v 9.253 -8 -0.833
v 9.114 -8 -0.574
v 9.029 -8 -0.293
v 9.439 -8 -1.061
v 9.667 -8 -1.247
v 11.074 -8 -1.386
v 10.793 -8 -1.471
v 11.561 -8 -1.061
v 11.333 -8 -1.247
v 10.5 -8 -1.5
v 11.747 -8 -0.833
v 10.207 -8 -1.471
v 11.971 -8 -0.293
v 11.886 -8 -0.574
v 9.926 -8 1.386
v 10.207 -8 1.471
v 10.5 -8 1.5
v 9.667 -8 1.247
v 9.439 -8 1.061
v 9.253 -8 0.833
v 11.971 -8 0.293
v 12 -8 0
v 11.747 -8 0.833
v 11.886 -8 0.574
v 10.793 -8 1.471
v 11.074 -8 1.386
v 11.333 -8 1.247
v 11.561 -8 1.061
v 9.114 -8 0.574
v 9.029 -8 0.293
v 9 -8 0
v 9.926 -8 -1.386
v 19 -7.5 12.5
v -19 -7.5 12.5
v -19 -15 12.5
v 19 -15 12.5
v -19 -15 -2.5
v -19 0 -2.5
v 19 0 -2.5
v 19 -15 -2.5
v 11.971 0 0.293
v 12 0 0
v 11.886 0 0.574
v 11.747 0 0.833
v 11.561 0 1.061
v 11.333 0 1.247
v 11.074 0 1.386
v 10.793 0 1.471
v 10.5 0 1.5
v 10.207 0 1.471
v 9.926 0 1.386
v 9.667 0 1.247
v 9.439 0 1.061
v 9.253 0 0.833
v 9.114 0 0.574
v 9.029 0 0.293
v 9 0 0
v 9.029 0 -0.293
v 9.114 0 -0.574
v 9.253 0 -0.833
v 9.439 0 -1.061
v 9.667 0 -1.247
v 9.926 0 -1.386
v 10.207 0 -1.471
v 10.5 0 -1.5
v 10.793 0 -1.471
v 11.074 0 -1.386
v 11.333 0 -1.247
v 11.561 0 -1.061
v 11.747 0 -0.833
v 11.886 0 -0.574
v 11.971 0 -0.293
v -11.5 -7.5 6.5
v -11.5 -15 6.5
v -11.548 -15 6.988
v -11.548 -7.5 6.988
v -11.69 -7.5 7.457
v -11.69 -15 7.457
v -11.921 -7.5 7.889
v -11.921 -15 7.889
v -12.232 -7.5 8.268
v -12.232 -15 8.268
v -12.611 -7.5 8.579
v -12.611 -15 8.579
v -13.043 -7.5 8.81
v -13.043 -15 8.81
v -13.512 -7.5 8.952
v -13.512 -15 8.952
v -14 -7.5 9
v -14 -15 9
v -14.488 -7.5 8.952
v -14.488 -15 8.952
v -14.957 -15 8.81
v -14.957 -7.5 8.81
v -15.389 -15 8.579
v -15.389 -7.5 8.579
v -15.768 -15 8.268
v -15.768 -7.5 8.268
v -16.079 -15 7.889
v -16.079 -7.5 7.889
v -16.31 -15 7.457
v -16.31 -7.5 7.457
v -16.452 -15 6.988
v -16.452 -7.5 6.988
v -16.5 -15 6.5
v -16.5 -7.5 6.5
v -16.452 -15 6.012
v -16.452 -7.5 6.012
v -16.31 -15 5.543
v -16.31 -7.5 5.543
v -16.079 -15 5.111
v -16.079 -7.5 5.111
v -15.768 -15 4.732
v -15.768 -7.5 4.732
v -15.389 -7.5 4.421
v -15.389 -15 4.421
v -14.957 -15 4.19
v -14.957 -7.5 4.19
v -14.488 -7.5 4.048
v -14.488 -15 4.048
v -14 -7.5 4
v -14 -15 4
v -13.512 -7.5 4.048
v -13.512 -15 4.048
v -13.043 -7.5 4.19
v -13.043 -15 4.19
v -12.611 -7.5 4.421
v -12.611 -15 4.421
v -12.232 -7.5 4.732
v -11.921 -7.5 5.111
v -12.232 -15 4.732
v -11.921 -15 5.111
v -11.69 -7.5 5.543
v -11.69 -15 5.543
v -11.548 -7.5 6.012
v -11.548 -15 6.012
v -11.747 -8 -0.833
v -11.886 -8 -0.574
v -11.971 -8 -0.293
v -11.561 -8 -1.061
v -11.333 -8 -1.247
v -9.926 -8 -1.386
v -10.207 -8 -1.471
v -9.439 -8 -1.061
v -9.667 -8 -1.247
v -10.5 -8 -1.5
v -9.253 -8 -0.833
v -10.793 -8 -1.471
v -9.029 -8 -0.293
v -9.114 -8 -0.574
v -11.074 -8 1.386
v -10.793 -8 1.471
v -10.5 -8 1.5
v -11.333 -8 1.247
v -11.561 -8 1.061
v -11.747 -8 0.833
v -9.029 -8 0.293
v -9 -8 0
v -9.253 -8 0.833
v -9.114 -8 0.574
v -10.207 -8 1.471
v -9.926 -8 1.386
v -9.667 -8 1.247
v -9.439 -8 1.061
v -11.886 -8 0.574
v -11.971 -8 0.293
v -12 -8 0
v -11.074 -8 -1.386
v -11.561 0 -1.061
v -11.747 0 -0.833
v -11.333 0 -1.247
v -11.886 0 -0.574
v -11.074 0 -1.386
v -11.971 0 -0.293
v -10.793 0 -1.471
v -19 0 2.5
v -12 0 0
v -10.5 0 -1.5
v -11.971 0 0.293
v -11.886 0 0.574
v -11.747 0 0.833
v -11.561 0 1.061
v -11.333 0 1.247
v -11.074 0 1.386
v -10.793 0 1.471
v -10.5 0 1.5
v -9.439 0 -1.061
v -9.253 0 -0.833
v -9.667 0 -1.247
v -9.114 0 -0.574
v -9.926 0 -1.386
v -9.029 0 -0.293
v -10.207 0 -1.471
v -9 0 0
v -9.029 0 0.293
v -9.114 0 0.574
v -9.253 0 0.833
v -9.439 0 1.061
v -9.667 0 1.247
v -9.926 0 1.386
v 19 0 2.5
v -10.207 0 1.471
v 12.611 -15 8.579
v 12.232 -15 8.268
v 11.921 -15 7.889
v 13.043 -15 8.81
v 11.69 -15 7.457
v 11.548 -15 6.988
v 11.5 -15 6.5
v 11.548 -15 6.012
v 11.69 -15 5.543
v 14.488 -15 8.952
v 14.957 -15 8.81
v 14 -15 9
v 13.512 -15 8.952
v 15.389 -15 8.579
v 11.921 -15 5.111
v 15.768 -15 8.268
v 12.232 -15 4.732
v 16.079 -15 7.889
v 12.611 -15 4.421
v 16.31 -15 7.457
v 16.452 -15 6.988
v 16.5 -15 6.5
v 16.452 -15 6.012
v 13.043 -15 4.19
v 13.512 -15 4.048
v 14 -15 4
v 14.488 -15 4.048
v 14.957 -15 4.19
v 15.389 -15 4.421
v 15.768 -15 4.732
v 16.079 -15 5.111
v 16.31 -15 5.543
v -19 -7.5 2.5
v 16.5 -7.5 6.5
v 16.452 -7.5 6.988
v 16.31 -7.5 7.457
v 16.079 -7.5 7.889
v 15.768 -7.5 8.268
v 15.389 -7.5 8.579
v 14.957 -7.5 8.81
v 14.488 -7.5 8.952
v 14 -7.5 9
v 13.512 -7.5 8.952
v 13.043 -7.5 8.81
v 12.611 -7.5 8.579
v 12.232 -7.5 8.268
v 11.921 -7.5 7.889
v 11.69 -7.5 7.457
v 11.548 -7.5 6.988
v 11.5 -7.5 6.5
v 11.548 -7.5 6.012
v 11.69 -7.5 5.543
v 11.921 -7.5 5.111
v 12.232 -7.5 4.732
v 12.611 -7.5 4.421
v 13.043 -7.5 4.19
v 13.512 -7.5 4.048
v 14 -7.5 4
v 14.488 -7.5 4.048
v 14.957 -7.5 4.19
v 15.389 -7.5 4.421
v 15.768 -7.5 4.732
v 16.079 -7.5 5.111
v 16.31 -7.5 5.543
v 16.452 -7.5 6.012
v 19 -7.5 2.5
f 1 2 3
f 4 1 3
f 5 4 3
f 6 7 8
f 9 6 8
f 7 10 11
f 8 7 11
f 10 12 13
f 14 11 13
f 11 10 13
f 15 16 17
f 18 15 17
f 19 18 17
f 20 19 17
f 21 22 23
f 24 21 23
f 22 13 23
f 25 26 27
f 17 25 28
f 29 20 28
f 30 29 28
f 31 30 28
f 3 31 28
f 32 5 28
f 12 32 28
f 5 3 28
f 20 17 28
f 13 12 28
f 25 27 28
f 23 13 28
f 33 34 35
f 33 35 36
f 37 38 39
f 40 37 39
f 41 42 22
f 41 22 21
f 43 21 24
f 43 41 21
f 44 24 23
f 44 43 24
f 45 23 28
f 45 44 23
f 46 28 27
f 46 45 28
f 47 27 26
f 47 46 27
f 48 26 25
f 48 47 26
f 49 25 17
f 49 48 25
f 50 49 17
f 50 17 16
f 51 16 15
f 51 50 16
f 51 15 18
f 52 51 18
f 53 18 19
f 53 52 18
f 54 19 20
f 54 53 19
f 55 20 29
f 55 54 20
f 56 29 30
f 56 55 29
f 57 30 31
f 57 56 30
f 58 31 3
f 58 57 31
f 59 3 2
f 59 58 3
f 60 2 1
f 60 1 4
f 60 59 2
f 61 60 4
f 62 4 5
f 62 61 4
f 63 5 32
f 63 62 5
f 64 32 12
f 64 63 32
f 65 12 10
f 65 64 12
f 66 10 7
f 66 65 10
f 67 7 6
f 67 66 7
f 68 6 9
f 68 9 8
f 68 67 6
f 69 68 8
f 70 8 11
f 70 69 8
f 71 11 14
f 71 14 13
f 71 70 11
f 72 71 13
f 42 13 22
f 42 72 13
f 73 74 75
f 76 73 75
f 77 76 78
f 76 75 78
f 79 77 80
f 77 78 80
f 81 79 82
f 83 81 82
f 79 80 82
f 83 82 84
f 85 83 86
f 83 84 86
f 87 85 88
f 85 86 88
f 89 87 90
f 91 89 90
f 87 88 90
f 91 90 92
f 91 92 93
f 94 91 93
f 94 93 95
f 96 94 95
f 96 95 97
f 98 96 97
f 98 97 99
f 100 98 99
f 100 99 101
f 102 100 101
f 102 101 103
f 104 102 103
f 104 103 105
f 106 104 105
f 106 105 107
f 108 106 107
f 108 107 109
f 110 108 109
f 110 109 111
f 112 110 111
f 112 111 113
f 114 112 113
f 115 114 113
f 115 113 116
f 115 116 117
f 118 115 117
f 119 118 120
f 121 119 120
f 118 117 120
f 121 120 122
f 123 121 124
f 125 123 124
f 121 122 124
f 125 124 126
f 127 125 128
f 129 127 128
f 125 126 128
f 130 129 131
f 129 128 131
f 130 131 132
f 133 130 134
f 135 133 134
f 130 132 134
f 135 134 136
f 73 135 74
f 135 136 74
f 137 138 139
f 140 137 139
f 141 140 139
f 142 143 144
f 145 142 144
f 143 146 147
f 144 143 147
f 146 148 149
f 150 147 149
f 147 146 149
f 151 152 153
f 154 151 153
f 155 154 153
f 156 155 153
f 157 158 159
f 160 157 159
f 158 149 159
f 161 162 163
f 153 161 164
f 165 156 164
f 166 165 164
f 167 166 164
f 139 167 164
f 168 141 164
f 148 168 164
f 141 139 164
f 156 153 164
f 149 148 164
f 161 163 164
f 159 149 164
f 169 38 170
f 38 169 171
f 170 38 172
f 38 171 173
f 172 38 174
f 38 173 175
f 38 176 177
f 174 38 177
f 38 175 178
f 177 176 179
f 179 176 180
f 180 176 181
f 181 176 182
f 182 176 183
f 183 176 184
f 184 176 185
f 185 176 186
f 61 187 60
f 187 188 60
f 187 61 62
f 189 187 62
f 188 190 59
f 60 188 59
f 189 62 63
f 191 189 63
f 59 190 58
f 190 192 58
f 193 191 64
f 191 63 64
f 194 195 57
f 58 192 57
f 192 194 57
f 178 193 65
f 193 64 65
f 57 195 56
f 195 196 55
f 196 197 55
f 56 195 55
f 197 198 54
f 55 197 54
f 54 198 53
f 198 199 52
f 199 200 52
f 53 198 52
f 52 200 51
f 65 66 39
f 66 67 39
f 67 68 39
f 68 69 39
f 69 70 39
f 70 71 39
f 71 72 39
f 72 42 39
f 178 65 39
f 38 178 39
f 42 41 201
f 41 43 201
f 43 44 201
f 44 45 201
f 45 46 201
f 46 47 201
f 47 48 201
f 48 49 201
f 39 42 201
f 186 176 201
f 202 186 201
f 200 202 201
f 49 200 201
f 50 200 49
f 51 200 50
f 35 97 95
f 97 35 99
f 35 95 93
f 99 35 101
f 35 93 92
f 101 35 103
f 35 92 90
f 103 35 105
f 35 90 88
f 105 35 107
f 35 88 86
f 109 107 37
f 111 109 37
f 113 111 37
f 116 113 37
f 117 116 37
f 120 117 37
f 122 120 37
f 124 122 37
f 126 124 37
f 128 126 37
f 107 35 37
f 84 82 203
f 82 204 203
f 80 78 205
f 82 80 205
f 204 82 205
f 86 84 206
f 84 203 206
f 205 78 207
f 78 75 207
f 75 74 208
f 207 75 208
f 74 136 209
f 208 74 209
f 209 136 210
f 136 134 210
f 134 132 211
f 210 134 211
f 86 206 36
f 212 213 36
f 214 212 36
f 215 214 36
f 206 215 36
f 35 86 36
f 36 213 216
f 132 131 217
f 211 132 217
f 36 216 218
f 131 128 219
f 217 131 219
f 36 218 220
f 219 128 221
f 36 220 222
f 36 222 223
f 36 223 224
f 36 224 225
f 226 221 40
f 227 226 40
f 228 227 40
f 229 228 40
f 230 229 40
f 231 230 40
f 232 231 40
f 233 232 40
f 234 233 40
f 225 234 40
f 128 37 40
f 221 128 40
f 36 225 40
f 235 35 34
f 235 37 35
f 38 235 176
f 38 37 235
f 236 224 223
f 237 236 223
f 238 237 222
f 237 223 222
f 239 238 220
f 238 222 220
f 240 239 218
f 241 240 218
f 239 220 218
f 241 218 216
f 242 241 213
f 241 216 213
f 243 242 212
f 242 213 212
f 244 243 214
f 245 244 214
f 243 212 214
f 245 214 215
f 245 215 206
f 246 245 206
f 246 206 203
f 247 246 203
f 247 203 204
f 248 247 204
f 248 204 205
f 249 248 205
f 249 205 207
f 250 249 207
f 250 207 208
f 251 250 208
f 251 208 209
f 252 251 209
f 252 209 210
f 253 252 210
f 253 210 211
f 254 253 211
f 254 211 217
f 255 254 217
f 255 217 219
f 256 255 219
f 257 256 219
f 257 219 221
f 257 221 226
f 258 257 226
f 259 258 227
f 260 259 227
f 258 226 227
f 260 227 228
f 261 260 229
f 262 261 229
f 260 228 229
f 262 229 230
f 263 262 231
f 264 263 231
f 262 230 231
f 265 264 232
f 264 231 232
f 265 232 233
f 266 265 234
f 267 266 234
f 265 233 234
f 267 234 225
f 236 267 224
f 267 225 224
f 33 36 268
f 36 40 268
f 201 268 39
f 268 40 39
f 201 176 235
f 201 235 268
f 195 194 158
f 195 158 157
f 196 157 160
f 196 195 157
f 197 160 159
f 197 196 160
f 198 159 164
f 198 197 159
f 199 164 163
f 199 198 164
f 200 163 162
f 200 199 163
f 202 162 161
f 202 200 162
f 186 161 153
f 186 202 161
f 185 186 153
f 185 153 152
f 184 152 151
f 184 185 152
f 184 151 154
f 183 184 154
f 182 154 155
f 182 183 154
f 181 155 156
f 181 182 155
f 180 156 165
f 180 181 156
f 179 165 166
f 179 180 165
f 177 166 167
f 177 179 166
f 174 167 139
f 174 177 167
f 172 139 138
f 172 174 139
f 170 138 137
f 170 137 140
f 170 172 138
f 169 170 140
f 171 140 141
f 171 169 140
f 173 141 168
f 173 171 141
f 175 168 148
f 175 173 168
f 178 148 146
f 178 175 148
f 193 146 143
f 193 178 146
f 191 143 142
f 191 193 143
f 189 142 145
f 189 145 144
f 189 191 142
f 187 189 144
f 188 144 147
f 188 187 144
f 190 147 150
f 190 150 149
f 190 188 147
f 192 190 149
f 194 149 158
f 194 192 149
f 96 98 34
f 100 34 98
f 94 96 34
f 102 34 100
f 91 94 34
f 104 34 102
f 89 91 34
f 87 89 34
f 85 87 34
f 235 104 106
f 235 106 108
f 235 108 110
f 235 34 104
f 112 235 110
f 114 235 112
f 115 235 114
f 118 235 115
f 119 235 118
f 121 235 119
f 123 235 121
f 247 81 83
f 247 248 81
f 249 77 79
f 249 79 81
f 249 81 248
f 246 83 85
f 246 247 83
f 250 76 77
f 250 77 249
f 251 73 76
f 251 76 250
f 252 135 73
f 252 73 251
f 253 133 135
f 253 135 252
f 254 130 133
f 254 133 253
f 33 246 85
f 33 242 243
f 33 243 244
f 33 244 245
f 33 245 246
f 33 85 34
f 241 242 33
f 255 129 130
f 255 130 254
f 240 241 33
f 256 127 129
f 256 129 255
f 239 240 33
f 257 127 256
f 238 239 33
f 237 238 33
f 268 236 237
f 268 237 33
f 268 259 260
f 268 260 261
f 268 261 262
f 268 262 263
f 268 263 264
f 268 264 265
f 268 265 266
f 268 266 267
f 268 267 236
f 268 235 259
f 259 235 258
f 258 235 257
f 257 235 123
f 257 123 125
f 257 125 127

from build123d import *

# Parameters (mm, degrees)
F0_W     = 38
F0_H     = 5
F1_DEPTH = 15
F2_R     = 1.5
F3_DEPTH = 8
F4_W     = 38
F4_H     = 7.5
F5_DEPTH = 10
F6_R     = 2.5
F7_DEPTH = 10


with BuildPart() as f1:
    # F0 (on Front) → F1 (new body)
    with BuildSketch(Plane.XZ):
        Rectangle(F0_W, F0_H)
    extrude(amount=F1_DEPTH)

    # F2 (on face) → F3 (cut)
    with BuildSketch(Plane.XZ):
        with Locations((-10.5, 0)):
            Circle(F2_R)
        with Locations((10.5, 0)):
            Circle(F2_R)
    extrude(amount=F3_DEPTH, mode=Mode.SUBTRACT)

    # F4 (on face) → F5 (join)
    with BuildSketch(Plane.XY.offset(2.5)):
        with Locations((0, -11.25)):
            Rectangle(F4_W, F4_H)
    extrude(amount=F5_DEPTH)

    # F6 (on face) → F7 (cut)
    with BuildSketch(Plane.XZ.offset(15)):
        with Locations((-14, 6.5)):
            Circle(F6_R)
        with Locations((14, 6.5)):
            Circle(F6_R)
    extrude(amount=-F7_DEPTH, mode=Mode.SUBTRACT)


solid = f1.part
